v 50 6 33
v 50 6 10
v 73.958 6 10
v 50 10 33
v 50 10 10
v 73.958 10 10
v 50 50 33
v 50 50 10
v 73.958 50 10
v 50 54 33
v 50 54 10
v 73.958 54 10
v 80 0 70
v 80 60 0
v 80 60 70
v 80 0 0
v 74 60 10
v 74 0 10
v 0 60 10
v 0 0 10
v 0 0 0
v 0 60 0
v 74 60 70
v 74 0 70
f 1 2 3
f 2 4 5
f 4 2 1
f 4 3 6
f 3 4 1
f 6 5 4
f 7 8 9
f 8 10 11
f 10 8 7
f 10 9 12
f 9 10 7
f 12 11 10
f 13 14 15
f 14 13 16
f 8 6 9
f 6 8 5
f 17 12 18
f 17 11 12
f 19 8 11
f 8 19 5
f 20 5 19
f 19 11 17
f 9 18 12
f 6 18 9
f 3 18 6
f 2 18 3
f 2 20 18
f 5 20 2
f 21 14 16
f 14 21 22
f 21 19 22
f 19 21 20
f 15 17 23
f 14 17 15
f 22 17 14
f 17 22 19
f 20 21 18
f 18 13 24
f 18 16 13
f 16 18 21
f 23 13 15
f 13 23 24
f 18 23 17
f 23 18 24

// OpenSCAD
$fn = 32;

// ----------------------------------------------------------------------
// Rib bracket: 2-gusset L bracket
// ----------------------------------------------------------------------

// --- parameters (mm) ---
base_l = 80;              // foot length, X
base_w = 60;              // foot width, Y
base_t = 10;              // foot thickness
plate_t = 6;              // upright plate thickness
plate_h = 70;             // overall height
gus_l = 24;               // gusset leg along the foot
gus_h = 24;               // gusset height
gus_t = 4;                // gusset thickness
gus_edge = 6;             // gusset margin from the foot edge
n_gus = 2;                // gusset count
fit_tol = 0.05;           // tolerance for press fits, mm
free_tol = 0.3;           // tolerance for clearance fits, mm

gus_pitch = (base_w - 2 * gus_edge - gus_t) / (n_gus - 1);  // gusset pitch

union() {
  cube([base_l, base_w, base_t]);
  translate([base_l - plate_t, 0, base_t - 1])
    cube([plate_t, base_w, plate_h - base_t + 1]);
  for (i = [0 : n_gus - 1])
    translate([base_l - plate_t - gus_l, gus_edge + i * gus_pitch, base_t - 1])
      rotate([-90, 0, 0])
        linear_extrude(height = gus_t)
          polygon(points = [[0, 0], [gus_l + 1, 0], [0, -gus_h]]);
}
